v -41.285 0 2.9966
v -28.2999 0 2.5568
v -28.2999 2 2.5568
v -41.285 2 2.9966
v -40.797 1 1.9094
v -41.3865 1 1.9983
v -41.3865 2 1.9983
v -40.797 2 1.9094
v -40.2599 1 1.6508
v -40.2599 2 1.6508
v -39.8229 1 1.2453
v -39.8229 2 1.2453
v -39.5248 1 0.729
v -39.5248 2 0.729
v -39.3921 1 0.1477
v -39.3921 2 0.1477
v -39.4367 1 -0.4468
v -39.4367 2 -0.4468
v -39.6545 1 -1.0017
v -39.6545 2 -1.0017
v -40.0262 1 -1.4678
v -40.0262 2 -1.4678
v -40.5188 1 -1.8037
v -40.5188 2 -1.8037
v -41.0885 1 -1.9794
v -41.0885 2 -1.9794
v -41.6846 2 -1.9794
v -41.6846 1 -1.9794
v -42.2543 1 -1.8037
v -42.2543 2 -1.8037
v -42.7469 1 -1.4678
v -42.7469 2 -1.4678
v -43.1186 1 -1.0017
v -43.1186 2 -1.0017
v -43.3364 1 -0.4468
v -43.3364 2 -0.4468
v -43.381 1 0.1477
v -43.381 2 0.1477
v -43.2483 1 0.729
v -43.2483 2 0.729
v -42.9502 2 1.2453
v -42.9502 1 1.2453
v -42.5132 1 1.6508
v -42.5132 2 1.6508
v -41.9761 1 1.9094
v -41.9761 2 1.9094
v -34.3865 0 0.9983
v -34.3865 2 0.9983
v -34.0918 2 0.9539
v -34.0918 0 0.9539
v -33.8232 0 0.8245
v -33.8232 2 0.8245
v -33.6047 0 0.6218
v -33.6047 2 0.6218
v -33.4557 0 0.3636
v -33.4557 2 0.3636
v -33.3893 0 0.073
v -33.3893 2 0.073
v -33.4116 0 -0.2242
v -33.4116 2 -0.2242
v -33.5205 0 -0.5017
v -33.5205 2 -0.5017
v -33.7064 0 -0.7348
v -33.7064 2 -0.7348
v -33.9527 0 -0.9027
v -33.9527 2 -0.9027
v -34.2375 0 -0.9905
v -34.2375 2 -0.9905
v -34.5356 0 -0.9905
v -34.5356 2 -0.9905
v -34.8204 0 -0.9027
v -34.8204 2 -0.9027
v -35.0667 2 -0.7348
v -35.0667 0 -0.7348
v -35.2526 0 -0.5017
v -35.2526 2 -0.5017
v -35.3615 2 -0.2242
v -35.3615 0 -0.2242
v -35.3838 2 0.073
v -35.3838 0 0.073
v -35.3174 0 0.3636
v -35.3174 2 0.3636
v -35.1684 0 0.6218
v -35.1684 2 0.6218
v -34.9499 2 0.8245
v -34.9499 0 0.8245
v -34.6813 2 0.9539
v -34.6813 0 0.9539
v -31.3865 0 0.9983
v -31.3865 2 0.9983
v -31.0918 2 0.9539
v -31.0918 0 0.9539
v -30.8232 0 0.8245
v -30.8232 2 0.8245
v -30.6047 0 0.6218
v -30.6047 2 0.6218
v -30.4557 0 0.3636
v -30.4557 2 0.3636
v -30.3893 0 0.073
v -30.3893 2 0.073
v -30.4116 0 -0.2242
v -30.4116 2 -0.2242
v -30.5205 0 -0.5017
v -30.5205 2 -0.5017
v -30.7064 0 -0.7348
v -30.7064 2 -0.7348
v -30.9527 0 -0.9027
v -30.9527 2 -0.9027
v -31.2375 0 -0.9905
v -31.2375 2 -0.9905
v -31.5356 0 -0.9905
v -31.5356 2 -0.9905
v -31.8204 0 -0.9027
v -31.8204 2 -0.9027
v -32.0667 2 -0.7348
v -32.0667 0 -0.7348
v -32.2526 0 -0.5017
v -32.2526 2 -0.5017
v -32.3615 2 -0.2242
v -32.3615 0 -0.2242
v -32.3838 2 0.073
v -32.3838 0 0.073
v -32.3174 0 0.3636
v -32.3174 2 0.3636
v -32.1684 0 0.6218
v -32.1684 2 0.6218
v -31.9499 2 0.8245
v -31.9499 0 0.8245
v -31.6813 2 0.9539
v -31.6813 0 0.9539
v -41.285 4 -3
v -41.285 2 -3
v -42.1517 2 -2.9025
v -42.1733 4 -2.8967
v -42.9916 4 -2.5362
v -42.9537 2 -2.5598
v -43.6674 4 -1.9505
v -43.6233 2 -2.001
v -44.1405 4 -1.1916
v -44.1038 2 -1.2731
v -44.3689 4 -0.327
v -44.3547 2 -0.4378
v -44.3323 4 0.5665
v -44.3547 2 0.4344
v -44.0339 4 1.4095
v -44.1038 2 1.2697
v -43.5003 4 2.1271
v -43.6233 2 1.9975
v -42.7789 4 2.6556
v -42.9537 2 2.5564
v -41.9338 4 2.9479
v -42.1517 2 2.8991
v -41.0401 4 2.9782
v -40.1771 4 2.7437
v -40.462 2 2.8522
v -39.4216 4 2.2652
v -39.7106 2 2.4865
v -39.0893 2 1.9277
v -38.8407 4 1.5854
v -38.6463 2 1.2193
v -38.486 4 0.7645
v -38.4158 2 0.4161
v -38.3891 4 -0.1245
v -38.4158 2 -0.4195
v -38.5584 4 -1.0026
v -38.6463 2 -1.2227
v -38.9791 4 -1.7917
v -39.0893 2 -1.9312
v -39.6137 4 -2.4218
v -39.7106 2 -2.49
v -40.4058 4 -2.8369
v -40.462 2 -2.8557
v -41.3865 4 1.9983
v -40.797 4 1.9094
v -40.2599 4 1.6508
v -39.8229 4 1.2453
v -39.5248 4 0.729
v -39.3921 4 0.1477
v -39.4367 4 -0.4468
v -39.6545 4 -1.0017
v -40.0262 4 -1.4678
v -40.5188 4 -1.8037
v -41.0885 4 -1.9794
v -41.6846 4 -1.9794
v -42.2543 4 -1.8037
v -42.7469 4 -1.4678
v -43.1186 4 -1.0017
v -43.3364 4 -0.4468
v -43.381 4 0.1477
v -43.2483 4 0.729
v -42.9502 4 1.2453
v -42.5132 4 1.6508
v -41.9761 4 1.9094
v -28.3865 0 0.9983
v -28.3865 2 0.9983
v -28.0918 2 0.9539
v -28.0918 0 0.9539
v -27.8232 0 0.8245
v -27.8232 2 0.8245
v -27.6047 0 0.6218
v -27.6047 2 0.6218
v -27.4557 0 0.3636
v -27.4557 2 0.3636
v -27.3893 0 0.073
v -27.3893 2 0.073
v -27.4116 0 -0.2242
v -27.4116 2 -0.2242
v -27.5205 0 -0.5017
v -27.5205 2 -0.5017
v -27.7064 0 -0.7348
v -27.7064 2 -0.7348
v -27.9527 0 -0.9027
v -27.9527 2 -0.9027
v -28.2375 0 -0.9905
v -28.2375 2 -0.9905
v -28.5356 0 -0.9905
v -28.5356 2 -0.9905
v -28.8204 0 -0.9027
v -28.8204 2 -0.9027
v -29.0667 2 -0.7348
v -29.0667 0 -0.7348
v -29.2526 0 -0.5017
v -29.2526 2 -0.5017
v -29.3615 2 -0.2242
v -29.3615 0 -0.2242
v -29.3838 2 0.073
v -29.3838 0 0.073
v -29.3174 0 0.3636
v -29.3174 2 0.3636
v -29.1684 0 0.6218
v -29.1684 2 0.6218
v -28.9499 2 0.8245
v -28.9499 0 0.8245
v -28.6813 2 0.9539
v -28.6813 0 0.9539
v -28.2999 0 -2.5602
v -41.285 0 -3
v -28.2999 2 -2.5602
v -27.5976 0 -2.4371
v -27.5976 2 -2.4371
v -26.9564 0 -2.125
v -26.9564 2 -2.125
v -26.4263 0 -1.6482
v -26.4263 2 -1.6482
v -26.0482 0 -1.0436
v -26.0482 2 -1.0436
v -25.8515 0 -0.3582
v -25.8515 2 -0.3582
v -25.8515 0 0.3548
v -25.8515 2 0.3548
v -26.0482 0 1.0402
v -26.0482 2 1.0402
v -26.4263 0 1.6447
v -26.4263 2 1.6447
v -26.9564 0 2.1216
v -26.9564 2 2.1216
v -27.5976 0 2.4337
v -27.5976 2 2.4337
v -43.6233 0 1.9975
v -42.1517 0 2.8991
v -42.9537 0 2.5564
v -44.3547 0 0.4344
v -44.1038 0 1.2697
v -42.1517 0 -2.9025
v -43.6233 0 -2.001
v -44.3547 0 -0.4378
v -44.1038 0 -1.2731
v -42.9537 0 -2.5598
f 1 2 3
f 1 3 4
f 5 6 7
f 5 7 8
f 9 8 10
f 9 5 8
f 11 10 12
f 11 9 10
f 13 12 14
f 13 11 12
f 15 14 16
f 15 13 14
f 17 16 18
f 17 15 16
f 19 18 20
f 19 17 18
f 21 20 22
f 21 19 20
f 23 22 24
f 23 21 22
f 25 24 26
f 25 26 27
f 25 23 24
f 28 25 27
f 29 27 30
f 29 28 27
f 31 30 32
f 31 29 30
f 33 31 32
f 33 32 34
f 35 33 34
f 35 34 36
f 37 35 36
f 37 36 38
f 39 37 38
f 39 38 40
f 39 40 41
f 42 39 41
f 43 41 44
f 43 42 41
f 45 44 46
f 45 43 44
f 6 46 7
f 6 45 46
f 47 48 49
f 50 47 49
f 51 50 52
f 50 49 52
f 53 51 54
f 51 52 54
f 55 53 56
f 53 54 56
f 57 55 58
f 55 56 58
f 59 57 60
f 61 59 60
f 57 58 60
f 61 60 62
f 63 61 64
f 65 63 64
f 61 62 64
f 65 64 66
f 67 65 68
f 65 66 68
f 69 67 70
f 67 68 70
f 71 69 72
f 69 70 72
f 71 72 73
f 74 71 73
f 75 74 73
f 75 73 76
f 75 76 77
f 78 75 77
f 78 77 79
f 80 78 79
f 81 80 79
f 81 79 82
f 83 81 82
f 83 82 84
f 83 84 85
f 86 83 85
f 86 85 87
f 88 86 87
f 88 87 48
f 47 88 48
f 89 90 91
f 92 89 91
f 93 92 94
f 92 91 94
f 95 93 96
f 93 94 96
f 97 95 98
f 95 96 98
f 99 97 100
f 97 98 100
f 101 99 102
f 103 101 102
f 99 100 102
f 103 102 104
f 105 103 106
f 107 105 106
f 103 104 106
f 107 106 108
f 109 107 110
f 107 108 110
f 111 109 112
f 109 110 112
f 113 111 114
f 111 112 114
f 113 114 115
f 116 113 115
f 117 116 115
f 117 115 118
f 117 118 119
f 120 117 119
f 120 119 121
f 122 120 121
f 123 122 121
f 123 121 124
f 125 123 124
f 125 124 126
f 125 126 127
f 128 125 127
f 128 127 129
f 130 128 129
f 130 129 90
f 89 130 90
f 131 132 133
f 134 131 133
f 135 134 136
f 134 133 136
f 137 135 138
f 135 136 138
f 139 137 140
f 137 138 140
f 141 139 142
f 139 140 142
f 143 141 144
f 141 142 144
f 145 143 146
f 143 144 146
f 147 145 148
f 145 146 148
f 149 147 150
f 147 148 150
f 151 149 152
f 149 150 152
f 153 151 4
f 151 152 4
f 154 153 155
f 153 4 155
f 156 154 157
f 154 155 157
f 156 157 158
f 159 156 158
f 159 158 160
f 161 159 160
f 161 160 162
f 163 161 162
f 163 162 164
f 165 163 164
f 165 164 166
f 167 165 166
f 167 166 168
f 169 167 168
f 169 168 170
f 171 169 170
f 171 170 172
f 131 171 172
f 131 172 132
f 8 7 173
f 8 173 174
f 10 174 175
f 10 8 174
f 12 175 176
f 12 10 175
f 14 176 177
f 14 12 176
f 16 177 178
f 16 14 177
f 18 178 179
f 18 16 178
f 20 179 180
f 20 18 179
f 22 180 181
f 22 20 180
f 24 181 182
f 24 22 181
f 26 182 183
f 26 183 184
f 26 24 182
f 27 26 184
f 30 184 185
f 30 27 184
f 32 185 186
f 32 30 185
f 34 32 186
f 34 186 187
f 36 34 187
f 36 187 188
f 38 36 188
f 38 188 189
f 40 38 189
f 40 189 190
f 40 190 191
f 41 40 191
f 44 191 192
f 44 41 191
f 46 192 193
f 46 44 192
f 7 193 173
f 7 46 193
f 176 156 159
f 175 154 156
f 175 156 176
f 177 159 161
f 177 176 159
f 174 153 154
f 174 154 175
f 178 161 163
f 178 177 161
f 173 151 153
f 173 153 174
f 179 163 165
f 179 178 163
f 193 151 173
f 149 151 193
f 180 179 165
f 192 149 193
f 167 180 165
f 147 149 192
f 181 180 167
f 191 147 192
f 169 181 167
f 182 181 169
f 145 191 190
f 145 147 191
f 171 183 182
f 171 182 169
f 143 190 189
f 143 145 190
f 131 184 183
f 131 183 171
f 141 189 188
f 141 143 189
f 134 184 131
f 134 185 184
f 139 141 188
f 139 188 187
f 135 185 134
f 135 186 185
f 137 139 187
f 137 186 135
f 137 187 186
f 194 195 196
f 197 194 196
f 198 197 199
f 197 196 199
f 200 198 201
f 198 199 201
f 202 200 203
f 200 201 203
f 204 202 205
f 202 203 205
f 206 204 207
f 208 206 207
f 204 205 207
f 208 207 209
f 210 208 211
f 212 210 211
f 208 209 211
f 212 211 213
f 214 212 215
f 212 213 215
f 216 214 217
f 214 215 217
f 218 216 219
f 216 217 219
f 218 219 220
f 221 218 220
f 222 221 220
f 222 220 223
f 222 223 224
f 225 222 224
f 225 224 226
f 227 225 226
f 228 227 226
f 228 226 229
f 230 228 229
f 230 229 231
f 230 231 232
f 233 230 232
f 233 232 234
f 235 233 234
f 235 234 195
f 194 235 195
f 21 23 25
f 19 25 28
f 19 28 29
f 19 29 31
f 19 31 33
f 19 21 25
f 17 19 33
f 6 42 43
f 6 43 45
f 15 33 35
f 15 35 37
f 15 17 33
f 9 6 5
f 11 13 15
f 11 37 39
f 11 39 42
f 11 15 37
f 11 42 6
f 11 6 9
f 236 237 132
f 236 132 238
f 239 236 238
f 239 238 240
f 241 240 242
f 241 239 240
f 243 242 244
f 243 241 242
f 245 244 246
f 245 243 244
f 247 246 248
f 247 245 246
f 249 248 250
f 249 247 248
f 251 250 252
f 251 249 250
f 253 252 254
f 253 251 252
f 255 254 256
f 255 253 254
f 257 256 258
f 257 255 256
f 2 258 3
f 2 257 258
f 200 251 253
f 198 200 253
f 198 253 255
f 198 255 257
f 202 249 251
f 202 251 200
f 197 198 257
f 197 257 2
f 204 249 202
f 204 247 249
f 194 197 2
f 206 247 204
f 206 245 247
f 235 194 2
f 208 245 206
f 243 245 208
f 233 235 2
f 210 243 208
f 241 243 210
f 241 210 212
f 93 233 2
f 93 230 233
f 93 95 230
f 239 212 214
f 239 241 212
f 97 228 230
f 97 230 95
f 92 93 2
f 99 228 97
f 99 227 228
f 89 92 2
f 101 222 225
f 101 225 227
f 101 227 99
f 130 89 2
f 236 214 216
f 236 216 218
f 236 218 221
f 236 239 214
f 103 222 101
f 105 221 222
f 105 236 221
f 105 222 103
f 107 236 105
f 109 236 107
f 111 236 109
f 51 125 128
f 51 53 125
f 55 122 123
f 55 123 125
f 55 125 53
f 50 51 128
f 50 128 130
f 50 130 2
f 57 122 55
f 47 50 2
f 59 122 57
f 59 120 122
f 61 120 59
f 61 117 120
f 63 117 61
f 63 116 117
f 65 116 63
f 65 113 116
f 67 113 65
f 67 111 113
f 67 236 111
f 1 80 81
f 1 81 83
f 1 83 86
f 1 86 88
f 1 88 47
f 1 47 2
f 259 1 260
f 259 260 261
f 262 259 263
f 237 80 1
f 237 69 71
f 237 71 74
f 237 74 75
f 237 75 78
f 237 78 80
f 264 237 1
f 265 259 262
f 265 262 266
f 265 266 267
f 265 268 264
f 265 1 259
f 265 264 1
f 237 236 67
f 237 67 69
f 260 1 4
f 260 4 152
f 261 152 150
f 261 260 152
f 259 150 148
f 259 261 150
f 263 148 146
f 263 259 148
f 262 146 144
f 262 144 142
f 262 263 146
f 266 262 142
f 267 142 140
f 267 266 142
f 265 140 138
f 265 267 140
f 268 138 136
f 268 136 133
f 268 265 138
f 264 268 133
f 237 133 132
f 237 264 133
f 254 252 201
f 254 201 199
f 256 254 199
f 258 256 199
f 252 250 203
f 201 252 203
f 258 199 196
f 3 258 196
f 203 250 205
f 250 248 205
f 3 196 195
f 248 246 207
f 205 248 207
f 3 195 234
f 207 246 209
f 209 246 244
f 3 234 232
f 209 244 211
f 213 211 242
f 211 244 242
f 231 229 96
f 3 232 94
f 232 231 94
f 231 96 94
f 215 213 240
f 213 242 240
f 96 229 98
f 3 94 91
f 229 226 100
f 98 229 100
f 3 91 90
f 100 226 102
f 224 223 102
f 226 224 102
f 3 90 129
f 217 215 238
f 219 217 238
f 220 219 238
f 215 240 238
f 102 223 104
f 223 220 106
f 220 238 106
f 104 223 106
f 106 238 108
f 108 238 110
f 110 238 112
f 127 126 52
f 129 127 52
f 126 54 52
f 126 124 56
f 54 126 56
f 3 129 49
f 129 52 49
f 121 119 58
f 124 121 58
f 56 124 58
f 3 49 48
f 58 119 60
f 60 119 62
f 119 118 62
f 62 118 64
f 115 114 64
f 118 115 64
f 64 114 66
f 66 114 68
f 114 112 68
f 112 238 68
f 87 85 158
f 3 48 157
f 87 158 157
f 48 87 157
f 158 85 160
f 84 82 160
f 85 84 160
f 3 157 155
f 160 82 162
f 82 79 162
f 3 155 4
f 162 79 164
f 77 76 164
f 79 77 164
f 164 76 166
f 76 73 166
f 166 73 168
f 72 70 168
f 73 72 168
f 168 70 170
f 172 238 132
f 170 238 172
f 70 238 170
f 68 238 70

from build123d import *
from build123d.topology import SkipClean

# Parameters (mm, degrees)
EXTRUSION1_DEPTH = 2
EXTRUSION2_REACH = 46.533
ESQUISSE2_R      = 1
ESQUISSE3_R      = 3
ESQUISSE3_R_2    = 2
EXTRUSION3_DEPTH = 2
EXTRUSION4_START = -1
ESQUISSE4_R      = 2
EXTRUSION4_DEPTH = 1


with BuildPart() as part:
    # Esquisse1 → Extrusion1 (new body)
    with BuildSketch(Plane(origin=(0, 0, 0), x_dir=(1, 0, 0), z_dir=(0, 1, 0))):
        with BuildLine():
            Line((-41.28500686, 2.999999015), (-28.299900327, 2.560234019))
            ThreePointArc((-28.299900327, 2.560234019), (-25.826566394, 0.001717984), (-28.299900327, -2.55679805))
            Line((-28.299900327, -2.55679805), (-41.28500686, -2.996563046))
            ThreePointArc((-41.28500686, -2.996563046), (-44.386549273, 0.001717984), (-41.28500686, 2.999999015))
        make_face()
    extrude(amount=EXTRUSION1_DEPTH)

    # Esquisse2 → Extrusion2 (cut, up to next)
    with BuildSketch(Plane(origin=(0, 2, 0), x_dir=(-1, 0, 0), z_dir=(0, 1, 0)), mode=Mode.PRIVATE) as extrusion2_sk1:
        with Locations(Location((34.386549273, -0.001717984, 0), (0, 0, 90))):
            Circle(ESQUISSE2_R)
    extrusion2_tool1 = extrude(extrusion2_sk1.sketch, amount=-EXTRUSION2_REACH, mode=Mode.PRIVATE) & part.part
    # Esquisse2 → Extrusion2 (cut, up to next)
    with BuildSketch(Plane(origin=(0, 2, 0), x_dir=(-1, 0, 0), z_dir=(0, 1, 0)), mode=Mode.PRIVATE) as extrusion2_sk2:
        with Locations(Location((31.386549273, -0.001717984, 0), (0, 0, 90))):
            Circle(ESQUISSE2_R)
    extrusion2_tool2 = extrude(extrusion2_sk2.sketch, amount=-EXTRUSION2_REACH, mode=Mode.PRIVATE) & part.part
    # Esquisse2 → Extrusion2 (cut, up to next)
    with BuildSketch(Plane(origin=(0, 2, 0), x_dir=(-1, 0, 0), z_dir=(0, 1, 0)), mode=Mode.PRIVATE) as extrusion2_sk3:
        with Locations(Location((28.386549273, -0.001717984, 0), (0, 0, 90))):
            Circle(ESQUISSE2_R)
    extrusion2_tool3 = extrude(extrusion2_sk3.sketch, amount=-EXTRUSION2_REACH, mode=Mode.PRIVATE) & part.part
    add(extrusion2_tool1.solids().sort_by_distance((-34.386549, 2, -0.001718))[0], mode=Mode.SUBTRACT)
    add(extrusion2_tool2.solids().sort_by_distance((-31.386549, 2, -0.001718))[0], mode=Mode.SUBTRACT)
    add(extrusion2_tool3.solids().sort_by_distance((-28.386549, 2, -0.001718))[0], mode=Mode.SUBTRACT)

    # Esquisse3 → Extrusion3 (add)
    with SkipClean():  # the faces are left unmerged after this step: merging them gives an invalid solid
        with BuildSketch(Plane(origin=(0, 2, 0), x_dir=(1, 0, 0), z_dir=(0, 1, 0))):
            with Locations(Location((-41.386549273, 0.001717984, 0), (0, 0, 88.060312285))):
                Circle(ESQUISSE3_R)
            with Locations(Location((-41.386549273, 0.001717984, 0), (0, 0, 270))):
                Circle(ESQUISSE3_R_2, mode=Mode.SUBTRACT)
        extrude(amount=EXTRUSION3_DEPTH)

    # Esquisse4 → Extrusion4 (cut)
    with SkipClean():  # the faces are left unmerged after this step: merging them gives an invalid solid
        with BuildSketch(Plane(origin=(0, 2, 0), x_dir=(1, 0, 0), z_dir=(0, 1, 0)).offset(EXTRUSION4_START)):
            with Locations(Location((-41.386549273, 0.001717984, 0), (0, 0, 270))):
                Circle(ESQUISSE4_R)
        extrude(amount=EXTRUSION4_DEPTH, mode=Mode.SUBTRACT)


solid = part.part
